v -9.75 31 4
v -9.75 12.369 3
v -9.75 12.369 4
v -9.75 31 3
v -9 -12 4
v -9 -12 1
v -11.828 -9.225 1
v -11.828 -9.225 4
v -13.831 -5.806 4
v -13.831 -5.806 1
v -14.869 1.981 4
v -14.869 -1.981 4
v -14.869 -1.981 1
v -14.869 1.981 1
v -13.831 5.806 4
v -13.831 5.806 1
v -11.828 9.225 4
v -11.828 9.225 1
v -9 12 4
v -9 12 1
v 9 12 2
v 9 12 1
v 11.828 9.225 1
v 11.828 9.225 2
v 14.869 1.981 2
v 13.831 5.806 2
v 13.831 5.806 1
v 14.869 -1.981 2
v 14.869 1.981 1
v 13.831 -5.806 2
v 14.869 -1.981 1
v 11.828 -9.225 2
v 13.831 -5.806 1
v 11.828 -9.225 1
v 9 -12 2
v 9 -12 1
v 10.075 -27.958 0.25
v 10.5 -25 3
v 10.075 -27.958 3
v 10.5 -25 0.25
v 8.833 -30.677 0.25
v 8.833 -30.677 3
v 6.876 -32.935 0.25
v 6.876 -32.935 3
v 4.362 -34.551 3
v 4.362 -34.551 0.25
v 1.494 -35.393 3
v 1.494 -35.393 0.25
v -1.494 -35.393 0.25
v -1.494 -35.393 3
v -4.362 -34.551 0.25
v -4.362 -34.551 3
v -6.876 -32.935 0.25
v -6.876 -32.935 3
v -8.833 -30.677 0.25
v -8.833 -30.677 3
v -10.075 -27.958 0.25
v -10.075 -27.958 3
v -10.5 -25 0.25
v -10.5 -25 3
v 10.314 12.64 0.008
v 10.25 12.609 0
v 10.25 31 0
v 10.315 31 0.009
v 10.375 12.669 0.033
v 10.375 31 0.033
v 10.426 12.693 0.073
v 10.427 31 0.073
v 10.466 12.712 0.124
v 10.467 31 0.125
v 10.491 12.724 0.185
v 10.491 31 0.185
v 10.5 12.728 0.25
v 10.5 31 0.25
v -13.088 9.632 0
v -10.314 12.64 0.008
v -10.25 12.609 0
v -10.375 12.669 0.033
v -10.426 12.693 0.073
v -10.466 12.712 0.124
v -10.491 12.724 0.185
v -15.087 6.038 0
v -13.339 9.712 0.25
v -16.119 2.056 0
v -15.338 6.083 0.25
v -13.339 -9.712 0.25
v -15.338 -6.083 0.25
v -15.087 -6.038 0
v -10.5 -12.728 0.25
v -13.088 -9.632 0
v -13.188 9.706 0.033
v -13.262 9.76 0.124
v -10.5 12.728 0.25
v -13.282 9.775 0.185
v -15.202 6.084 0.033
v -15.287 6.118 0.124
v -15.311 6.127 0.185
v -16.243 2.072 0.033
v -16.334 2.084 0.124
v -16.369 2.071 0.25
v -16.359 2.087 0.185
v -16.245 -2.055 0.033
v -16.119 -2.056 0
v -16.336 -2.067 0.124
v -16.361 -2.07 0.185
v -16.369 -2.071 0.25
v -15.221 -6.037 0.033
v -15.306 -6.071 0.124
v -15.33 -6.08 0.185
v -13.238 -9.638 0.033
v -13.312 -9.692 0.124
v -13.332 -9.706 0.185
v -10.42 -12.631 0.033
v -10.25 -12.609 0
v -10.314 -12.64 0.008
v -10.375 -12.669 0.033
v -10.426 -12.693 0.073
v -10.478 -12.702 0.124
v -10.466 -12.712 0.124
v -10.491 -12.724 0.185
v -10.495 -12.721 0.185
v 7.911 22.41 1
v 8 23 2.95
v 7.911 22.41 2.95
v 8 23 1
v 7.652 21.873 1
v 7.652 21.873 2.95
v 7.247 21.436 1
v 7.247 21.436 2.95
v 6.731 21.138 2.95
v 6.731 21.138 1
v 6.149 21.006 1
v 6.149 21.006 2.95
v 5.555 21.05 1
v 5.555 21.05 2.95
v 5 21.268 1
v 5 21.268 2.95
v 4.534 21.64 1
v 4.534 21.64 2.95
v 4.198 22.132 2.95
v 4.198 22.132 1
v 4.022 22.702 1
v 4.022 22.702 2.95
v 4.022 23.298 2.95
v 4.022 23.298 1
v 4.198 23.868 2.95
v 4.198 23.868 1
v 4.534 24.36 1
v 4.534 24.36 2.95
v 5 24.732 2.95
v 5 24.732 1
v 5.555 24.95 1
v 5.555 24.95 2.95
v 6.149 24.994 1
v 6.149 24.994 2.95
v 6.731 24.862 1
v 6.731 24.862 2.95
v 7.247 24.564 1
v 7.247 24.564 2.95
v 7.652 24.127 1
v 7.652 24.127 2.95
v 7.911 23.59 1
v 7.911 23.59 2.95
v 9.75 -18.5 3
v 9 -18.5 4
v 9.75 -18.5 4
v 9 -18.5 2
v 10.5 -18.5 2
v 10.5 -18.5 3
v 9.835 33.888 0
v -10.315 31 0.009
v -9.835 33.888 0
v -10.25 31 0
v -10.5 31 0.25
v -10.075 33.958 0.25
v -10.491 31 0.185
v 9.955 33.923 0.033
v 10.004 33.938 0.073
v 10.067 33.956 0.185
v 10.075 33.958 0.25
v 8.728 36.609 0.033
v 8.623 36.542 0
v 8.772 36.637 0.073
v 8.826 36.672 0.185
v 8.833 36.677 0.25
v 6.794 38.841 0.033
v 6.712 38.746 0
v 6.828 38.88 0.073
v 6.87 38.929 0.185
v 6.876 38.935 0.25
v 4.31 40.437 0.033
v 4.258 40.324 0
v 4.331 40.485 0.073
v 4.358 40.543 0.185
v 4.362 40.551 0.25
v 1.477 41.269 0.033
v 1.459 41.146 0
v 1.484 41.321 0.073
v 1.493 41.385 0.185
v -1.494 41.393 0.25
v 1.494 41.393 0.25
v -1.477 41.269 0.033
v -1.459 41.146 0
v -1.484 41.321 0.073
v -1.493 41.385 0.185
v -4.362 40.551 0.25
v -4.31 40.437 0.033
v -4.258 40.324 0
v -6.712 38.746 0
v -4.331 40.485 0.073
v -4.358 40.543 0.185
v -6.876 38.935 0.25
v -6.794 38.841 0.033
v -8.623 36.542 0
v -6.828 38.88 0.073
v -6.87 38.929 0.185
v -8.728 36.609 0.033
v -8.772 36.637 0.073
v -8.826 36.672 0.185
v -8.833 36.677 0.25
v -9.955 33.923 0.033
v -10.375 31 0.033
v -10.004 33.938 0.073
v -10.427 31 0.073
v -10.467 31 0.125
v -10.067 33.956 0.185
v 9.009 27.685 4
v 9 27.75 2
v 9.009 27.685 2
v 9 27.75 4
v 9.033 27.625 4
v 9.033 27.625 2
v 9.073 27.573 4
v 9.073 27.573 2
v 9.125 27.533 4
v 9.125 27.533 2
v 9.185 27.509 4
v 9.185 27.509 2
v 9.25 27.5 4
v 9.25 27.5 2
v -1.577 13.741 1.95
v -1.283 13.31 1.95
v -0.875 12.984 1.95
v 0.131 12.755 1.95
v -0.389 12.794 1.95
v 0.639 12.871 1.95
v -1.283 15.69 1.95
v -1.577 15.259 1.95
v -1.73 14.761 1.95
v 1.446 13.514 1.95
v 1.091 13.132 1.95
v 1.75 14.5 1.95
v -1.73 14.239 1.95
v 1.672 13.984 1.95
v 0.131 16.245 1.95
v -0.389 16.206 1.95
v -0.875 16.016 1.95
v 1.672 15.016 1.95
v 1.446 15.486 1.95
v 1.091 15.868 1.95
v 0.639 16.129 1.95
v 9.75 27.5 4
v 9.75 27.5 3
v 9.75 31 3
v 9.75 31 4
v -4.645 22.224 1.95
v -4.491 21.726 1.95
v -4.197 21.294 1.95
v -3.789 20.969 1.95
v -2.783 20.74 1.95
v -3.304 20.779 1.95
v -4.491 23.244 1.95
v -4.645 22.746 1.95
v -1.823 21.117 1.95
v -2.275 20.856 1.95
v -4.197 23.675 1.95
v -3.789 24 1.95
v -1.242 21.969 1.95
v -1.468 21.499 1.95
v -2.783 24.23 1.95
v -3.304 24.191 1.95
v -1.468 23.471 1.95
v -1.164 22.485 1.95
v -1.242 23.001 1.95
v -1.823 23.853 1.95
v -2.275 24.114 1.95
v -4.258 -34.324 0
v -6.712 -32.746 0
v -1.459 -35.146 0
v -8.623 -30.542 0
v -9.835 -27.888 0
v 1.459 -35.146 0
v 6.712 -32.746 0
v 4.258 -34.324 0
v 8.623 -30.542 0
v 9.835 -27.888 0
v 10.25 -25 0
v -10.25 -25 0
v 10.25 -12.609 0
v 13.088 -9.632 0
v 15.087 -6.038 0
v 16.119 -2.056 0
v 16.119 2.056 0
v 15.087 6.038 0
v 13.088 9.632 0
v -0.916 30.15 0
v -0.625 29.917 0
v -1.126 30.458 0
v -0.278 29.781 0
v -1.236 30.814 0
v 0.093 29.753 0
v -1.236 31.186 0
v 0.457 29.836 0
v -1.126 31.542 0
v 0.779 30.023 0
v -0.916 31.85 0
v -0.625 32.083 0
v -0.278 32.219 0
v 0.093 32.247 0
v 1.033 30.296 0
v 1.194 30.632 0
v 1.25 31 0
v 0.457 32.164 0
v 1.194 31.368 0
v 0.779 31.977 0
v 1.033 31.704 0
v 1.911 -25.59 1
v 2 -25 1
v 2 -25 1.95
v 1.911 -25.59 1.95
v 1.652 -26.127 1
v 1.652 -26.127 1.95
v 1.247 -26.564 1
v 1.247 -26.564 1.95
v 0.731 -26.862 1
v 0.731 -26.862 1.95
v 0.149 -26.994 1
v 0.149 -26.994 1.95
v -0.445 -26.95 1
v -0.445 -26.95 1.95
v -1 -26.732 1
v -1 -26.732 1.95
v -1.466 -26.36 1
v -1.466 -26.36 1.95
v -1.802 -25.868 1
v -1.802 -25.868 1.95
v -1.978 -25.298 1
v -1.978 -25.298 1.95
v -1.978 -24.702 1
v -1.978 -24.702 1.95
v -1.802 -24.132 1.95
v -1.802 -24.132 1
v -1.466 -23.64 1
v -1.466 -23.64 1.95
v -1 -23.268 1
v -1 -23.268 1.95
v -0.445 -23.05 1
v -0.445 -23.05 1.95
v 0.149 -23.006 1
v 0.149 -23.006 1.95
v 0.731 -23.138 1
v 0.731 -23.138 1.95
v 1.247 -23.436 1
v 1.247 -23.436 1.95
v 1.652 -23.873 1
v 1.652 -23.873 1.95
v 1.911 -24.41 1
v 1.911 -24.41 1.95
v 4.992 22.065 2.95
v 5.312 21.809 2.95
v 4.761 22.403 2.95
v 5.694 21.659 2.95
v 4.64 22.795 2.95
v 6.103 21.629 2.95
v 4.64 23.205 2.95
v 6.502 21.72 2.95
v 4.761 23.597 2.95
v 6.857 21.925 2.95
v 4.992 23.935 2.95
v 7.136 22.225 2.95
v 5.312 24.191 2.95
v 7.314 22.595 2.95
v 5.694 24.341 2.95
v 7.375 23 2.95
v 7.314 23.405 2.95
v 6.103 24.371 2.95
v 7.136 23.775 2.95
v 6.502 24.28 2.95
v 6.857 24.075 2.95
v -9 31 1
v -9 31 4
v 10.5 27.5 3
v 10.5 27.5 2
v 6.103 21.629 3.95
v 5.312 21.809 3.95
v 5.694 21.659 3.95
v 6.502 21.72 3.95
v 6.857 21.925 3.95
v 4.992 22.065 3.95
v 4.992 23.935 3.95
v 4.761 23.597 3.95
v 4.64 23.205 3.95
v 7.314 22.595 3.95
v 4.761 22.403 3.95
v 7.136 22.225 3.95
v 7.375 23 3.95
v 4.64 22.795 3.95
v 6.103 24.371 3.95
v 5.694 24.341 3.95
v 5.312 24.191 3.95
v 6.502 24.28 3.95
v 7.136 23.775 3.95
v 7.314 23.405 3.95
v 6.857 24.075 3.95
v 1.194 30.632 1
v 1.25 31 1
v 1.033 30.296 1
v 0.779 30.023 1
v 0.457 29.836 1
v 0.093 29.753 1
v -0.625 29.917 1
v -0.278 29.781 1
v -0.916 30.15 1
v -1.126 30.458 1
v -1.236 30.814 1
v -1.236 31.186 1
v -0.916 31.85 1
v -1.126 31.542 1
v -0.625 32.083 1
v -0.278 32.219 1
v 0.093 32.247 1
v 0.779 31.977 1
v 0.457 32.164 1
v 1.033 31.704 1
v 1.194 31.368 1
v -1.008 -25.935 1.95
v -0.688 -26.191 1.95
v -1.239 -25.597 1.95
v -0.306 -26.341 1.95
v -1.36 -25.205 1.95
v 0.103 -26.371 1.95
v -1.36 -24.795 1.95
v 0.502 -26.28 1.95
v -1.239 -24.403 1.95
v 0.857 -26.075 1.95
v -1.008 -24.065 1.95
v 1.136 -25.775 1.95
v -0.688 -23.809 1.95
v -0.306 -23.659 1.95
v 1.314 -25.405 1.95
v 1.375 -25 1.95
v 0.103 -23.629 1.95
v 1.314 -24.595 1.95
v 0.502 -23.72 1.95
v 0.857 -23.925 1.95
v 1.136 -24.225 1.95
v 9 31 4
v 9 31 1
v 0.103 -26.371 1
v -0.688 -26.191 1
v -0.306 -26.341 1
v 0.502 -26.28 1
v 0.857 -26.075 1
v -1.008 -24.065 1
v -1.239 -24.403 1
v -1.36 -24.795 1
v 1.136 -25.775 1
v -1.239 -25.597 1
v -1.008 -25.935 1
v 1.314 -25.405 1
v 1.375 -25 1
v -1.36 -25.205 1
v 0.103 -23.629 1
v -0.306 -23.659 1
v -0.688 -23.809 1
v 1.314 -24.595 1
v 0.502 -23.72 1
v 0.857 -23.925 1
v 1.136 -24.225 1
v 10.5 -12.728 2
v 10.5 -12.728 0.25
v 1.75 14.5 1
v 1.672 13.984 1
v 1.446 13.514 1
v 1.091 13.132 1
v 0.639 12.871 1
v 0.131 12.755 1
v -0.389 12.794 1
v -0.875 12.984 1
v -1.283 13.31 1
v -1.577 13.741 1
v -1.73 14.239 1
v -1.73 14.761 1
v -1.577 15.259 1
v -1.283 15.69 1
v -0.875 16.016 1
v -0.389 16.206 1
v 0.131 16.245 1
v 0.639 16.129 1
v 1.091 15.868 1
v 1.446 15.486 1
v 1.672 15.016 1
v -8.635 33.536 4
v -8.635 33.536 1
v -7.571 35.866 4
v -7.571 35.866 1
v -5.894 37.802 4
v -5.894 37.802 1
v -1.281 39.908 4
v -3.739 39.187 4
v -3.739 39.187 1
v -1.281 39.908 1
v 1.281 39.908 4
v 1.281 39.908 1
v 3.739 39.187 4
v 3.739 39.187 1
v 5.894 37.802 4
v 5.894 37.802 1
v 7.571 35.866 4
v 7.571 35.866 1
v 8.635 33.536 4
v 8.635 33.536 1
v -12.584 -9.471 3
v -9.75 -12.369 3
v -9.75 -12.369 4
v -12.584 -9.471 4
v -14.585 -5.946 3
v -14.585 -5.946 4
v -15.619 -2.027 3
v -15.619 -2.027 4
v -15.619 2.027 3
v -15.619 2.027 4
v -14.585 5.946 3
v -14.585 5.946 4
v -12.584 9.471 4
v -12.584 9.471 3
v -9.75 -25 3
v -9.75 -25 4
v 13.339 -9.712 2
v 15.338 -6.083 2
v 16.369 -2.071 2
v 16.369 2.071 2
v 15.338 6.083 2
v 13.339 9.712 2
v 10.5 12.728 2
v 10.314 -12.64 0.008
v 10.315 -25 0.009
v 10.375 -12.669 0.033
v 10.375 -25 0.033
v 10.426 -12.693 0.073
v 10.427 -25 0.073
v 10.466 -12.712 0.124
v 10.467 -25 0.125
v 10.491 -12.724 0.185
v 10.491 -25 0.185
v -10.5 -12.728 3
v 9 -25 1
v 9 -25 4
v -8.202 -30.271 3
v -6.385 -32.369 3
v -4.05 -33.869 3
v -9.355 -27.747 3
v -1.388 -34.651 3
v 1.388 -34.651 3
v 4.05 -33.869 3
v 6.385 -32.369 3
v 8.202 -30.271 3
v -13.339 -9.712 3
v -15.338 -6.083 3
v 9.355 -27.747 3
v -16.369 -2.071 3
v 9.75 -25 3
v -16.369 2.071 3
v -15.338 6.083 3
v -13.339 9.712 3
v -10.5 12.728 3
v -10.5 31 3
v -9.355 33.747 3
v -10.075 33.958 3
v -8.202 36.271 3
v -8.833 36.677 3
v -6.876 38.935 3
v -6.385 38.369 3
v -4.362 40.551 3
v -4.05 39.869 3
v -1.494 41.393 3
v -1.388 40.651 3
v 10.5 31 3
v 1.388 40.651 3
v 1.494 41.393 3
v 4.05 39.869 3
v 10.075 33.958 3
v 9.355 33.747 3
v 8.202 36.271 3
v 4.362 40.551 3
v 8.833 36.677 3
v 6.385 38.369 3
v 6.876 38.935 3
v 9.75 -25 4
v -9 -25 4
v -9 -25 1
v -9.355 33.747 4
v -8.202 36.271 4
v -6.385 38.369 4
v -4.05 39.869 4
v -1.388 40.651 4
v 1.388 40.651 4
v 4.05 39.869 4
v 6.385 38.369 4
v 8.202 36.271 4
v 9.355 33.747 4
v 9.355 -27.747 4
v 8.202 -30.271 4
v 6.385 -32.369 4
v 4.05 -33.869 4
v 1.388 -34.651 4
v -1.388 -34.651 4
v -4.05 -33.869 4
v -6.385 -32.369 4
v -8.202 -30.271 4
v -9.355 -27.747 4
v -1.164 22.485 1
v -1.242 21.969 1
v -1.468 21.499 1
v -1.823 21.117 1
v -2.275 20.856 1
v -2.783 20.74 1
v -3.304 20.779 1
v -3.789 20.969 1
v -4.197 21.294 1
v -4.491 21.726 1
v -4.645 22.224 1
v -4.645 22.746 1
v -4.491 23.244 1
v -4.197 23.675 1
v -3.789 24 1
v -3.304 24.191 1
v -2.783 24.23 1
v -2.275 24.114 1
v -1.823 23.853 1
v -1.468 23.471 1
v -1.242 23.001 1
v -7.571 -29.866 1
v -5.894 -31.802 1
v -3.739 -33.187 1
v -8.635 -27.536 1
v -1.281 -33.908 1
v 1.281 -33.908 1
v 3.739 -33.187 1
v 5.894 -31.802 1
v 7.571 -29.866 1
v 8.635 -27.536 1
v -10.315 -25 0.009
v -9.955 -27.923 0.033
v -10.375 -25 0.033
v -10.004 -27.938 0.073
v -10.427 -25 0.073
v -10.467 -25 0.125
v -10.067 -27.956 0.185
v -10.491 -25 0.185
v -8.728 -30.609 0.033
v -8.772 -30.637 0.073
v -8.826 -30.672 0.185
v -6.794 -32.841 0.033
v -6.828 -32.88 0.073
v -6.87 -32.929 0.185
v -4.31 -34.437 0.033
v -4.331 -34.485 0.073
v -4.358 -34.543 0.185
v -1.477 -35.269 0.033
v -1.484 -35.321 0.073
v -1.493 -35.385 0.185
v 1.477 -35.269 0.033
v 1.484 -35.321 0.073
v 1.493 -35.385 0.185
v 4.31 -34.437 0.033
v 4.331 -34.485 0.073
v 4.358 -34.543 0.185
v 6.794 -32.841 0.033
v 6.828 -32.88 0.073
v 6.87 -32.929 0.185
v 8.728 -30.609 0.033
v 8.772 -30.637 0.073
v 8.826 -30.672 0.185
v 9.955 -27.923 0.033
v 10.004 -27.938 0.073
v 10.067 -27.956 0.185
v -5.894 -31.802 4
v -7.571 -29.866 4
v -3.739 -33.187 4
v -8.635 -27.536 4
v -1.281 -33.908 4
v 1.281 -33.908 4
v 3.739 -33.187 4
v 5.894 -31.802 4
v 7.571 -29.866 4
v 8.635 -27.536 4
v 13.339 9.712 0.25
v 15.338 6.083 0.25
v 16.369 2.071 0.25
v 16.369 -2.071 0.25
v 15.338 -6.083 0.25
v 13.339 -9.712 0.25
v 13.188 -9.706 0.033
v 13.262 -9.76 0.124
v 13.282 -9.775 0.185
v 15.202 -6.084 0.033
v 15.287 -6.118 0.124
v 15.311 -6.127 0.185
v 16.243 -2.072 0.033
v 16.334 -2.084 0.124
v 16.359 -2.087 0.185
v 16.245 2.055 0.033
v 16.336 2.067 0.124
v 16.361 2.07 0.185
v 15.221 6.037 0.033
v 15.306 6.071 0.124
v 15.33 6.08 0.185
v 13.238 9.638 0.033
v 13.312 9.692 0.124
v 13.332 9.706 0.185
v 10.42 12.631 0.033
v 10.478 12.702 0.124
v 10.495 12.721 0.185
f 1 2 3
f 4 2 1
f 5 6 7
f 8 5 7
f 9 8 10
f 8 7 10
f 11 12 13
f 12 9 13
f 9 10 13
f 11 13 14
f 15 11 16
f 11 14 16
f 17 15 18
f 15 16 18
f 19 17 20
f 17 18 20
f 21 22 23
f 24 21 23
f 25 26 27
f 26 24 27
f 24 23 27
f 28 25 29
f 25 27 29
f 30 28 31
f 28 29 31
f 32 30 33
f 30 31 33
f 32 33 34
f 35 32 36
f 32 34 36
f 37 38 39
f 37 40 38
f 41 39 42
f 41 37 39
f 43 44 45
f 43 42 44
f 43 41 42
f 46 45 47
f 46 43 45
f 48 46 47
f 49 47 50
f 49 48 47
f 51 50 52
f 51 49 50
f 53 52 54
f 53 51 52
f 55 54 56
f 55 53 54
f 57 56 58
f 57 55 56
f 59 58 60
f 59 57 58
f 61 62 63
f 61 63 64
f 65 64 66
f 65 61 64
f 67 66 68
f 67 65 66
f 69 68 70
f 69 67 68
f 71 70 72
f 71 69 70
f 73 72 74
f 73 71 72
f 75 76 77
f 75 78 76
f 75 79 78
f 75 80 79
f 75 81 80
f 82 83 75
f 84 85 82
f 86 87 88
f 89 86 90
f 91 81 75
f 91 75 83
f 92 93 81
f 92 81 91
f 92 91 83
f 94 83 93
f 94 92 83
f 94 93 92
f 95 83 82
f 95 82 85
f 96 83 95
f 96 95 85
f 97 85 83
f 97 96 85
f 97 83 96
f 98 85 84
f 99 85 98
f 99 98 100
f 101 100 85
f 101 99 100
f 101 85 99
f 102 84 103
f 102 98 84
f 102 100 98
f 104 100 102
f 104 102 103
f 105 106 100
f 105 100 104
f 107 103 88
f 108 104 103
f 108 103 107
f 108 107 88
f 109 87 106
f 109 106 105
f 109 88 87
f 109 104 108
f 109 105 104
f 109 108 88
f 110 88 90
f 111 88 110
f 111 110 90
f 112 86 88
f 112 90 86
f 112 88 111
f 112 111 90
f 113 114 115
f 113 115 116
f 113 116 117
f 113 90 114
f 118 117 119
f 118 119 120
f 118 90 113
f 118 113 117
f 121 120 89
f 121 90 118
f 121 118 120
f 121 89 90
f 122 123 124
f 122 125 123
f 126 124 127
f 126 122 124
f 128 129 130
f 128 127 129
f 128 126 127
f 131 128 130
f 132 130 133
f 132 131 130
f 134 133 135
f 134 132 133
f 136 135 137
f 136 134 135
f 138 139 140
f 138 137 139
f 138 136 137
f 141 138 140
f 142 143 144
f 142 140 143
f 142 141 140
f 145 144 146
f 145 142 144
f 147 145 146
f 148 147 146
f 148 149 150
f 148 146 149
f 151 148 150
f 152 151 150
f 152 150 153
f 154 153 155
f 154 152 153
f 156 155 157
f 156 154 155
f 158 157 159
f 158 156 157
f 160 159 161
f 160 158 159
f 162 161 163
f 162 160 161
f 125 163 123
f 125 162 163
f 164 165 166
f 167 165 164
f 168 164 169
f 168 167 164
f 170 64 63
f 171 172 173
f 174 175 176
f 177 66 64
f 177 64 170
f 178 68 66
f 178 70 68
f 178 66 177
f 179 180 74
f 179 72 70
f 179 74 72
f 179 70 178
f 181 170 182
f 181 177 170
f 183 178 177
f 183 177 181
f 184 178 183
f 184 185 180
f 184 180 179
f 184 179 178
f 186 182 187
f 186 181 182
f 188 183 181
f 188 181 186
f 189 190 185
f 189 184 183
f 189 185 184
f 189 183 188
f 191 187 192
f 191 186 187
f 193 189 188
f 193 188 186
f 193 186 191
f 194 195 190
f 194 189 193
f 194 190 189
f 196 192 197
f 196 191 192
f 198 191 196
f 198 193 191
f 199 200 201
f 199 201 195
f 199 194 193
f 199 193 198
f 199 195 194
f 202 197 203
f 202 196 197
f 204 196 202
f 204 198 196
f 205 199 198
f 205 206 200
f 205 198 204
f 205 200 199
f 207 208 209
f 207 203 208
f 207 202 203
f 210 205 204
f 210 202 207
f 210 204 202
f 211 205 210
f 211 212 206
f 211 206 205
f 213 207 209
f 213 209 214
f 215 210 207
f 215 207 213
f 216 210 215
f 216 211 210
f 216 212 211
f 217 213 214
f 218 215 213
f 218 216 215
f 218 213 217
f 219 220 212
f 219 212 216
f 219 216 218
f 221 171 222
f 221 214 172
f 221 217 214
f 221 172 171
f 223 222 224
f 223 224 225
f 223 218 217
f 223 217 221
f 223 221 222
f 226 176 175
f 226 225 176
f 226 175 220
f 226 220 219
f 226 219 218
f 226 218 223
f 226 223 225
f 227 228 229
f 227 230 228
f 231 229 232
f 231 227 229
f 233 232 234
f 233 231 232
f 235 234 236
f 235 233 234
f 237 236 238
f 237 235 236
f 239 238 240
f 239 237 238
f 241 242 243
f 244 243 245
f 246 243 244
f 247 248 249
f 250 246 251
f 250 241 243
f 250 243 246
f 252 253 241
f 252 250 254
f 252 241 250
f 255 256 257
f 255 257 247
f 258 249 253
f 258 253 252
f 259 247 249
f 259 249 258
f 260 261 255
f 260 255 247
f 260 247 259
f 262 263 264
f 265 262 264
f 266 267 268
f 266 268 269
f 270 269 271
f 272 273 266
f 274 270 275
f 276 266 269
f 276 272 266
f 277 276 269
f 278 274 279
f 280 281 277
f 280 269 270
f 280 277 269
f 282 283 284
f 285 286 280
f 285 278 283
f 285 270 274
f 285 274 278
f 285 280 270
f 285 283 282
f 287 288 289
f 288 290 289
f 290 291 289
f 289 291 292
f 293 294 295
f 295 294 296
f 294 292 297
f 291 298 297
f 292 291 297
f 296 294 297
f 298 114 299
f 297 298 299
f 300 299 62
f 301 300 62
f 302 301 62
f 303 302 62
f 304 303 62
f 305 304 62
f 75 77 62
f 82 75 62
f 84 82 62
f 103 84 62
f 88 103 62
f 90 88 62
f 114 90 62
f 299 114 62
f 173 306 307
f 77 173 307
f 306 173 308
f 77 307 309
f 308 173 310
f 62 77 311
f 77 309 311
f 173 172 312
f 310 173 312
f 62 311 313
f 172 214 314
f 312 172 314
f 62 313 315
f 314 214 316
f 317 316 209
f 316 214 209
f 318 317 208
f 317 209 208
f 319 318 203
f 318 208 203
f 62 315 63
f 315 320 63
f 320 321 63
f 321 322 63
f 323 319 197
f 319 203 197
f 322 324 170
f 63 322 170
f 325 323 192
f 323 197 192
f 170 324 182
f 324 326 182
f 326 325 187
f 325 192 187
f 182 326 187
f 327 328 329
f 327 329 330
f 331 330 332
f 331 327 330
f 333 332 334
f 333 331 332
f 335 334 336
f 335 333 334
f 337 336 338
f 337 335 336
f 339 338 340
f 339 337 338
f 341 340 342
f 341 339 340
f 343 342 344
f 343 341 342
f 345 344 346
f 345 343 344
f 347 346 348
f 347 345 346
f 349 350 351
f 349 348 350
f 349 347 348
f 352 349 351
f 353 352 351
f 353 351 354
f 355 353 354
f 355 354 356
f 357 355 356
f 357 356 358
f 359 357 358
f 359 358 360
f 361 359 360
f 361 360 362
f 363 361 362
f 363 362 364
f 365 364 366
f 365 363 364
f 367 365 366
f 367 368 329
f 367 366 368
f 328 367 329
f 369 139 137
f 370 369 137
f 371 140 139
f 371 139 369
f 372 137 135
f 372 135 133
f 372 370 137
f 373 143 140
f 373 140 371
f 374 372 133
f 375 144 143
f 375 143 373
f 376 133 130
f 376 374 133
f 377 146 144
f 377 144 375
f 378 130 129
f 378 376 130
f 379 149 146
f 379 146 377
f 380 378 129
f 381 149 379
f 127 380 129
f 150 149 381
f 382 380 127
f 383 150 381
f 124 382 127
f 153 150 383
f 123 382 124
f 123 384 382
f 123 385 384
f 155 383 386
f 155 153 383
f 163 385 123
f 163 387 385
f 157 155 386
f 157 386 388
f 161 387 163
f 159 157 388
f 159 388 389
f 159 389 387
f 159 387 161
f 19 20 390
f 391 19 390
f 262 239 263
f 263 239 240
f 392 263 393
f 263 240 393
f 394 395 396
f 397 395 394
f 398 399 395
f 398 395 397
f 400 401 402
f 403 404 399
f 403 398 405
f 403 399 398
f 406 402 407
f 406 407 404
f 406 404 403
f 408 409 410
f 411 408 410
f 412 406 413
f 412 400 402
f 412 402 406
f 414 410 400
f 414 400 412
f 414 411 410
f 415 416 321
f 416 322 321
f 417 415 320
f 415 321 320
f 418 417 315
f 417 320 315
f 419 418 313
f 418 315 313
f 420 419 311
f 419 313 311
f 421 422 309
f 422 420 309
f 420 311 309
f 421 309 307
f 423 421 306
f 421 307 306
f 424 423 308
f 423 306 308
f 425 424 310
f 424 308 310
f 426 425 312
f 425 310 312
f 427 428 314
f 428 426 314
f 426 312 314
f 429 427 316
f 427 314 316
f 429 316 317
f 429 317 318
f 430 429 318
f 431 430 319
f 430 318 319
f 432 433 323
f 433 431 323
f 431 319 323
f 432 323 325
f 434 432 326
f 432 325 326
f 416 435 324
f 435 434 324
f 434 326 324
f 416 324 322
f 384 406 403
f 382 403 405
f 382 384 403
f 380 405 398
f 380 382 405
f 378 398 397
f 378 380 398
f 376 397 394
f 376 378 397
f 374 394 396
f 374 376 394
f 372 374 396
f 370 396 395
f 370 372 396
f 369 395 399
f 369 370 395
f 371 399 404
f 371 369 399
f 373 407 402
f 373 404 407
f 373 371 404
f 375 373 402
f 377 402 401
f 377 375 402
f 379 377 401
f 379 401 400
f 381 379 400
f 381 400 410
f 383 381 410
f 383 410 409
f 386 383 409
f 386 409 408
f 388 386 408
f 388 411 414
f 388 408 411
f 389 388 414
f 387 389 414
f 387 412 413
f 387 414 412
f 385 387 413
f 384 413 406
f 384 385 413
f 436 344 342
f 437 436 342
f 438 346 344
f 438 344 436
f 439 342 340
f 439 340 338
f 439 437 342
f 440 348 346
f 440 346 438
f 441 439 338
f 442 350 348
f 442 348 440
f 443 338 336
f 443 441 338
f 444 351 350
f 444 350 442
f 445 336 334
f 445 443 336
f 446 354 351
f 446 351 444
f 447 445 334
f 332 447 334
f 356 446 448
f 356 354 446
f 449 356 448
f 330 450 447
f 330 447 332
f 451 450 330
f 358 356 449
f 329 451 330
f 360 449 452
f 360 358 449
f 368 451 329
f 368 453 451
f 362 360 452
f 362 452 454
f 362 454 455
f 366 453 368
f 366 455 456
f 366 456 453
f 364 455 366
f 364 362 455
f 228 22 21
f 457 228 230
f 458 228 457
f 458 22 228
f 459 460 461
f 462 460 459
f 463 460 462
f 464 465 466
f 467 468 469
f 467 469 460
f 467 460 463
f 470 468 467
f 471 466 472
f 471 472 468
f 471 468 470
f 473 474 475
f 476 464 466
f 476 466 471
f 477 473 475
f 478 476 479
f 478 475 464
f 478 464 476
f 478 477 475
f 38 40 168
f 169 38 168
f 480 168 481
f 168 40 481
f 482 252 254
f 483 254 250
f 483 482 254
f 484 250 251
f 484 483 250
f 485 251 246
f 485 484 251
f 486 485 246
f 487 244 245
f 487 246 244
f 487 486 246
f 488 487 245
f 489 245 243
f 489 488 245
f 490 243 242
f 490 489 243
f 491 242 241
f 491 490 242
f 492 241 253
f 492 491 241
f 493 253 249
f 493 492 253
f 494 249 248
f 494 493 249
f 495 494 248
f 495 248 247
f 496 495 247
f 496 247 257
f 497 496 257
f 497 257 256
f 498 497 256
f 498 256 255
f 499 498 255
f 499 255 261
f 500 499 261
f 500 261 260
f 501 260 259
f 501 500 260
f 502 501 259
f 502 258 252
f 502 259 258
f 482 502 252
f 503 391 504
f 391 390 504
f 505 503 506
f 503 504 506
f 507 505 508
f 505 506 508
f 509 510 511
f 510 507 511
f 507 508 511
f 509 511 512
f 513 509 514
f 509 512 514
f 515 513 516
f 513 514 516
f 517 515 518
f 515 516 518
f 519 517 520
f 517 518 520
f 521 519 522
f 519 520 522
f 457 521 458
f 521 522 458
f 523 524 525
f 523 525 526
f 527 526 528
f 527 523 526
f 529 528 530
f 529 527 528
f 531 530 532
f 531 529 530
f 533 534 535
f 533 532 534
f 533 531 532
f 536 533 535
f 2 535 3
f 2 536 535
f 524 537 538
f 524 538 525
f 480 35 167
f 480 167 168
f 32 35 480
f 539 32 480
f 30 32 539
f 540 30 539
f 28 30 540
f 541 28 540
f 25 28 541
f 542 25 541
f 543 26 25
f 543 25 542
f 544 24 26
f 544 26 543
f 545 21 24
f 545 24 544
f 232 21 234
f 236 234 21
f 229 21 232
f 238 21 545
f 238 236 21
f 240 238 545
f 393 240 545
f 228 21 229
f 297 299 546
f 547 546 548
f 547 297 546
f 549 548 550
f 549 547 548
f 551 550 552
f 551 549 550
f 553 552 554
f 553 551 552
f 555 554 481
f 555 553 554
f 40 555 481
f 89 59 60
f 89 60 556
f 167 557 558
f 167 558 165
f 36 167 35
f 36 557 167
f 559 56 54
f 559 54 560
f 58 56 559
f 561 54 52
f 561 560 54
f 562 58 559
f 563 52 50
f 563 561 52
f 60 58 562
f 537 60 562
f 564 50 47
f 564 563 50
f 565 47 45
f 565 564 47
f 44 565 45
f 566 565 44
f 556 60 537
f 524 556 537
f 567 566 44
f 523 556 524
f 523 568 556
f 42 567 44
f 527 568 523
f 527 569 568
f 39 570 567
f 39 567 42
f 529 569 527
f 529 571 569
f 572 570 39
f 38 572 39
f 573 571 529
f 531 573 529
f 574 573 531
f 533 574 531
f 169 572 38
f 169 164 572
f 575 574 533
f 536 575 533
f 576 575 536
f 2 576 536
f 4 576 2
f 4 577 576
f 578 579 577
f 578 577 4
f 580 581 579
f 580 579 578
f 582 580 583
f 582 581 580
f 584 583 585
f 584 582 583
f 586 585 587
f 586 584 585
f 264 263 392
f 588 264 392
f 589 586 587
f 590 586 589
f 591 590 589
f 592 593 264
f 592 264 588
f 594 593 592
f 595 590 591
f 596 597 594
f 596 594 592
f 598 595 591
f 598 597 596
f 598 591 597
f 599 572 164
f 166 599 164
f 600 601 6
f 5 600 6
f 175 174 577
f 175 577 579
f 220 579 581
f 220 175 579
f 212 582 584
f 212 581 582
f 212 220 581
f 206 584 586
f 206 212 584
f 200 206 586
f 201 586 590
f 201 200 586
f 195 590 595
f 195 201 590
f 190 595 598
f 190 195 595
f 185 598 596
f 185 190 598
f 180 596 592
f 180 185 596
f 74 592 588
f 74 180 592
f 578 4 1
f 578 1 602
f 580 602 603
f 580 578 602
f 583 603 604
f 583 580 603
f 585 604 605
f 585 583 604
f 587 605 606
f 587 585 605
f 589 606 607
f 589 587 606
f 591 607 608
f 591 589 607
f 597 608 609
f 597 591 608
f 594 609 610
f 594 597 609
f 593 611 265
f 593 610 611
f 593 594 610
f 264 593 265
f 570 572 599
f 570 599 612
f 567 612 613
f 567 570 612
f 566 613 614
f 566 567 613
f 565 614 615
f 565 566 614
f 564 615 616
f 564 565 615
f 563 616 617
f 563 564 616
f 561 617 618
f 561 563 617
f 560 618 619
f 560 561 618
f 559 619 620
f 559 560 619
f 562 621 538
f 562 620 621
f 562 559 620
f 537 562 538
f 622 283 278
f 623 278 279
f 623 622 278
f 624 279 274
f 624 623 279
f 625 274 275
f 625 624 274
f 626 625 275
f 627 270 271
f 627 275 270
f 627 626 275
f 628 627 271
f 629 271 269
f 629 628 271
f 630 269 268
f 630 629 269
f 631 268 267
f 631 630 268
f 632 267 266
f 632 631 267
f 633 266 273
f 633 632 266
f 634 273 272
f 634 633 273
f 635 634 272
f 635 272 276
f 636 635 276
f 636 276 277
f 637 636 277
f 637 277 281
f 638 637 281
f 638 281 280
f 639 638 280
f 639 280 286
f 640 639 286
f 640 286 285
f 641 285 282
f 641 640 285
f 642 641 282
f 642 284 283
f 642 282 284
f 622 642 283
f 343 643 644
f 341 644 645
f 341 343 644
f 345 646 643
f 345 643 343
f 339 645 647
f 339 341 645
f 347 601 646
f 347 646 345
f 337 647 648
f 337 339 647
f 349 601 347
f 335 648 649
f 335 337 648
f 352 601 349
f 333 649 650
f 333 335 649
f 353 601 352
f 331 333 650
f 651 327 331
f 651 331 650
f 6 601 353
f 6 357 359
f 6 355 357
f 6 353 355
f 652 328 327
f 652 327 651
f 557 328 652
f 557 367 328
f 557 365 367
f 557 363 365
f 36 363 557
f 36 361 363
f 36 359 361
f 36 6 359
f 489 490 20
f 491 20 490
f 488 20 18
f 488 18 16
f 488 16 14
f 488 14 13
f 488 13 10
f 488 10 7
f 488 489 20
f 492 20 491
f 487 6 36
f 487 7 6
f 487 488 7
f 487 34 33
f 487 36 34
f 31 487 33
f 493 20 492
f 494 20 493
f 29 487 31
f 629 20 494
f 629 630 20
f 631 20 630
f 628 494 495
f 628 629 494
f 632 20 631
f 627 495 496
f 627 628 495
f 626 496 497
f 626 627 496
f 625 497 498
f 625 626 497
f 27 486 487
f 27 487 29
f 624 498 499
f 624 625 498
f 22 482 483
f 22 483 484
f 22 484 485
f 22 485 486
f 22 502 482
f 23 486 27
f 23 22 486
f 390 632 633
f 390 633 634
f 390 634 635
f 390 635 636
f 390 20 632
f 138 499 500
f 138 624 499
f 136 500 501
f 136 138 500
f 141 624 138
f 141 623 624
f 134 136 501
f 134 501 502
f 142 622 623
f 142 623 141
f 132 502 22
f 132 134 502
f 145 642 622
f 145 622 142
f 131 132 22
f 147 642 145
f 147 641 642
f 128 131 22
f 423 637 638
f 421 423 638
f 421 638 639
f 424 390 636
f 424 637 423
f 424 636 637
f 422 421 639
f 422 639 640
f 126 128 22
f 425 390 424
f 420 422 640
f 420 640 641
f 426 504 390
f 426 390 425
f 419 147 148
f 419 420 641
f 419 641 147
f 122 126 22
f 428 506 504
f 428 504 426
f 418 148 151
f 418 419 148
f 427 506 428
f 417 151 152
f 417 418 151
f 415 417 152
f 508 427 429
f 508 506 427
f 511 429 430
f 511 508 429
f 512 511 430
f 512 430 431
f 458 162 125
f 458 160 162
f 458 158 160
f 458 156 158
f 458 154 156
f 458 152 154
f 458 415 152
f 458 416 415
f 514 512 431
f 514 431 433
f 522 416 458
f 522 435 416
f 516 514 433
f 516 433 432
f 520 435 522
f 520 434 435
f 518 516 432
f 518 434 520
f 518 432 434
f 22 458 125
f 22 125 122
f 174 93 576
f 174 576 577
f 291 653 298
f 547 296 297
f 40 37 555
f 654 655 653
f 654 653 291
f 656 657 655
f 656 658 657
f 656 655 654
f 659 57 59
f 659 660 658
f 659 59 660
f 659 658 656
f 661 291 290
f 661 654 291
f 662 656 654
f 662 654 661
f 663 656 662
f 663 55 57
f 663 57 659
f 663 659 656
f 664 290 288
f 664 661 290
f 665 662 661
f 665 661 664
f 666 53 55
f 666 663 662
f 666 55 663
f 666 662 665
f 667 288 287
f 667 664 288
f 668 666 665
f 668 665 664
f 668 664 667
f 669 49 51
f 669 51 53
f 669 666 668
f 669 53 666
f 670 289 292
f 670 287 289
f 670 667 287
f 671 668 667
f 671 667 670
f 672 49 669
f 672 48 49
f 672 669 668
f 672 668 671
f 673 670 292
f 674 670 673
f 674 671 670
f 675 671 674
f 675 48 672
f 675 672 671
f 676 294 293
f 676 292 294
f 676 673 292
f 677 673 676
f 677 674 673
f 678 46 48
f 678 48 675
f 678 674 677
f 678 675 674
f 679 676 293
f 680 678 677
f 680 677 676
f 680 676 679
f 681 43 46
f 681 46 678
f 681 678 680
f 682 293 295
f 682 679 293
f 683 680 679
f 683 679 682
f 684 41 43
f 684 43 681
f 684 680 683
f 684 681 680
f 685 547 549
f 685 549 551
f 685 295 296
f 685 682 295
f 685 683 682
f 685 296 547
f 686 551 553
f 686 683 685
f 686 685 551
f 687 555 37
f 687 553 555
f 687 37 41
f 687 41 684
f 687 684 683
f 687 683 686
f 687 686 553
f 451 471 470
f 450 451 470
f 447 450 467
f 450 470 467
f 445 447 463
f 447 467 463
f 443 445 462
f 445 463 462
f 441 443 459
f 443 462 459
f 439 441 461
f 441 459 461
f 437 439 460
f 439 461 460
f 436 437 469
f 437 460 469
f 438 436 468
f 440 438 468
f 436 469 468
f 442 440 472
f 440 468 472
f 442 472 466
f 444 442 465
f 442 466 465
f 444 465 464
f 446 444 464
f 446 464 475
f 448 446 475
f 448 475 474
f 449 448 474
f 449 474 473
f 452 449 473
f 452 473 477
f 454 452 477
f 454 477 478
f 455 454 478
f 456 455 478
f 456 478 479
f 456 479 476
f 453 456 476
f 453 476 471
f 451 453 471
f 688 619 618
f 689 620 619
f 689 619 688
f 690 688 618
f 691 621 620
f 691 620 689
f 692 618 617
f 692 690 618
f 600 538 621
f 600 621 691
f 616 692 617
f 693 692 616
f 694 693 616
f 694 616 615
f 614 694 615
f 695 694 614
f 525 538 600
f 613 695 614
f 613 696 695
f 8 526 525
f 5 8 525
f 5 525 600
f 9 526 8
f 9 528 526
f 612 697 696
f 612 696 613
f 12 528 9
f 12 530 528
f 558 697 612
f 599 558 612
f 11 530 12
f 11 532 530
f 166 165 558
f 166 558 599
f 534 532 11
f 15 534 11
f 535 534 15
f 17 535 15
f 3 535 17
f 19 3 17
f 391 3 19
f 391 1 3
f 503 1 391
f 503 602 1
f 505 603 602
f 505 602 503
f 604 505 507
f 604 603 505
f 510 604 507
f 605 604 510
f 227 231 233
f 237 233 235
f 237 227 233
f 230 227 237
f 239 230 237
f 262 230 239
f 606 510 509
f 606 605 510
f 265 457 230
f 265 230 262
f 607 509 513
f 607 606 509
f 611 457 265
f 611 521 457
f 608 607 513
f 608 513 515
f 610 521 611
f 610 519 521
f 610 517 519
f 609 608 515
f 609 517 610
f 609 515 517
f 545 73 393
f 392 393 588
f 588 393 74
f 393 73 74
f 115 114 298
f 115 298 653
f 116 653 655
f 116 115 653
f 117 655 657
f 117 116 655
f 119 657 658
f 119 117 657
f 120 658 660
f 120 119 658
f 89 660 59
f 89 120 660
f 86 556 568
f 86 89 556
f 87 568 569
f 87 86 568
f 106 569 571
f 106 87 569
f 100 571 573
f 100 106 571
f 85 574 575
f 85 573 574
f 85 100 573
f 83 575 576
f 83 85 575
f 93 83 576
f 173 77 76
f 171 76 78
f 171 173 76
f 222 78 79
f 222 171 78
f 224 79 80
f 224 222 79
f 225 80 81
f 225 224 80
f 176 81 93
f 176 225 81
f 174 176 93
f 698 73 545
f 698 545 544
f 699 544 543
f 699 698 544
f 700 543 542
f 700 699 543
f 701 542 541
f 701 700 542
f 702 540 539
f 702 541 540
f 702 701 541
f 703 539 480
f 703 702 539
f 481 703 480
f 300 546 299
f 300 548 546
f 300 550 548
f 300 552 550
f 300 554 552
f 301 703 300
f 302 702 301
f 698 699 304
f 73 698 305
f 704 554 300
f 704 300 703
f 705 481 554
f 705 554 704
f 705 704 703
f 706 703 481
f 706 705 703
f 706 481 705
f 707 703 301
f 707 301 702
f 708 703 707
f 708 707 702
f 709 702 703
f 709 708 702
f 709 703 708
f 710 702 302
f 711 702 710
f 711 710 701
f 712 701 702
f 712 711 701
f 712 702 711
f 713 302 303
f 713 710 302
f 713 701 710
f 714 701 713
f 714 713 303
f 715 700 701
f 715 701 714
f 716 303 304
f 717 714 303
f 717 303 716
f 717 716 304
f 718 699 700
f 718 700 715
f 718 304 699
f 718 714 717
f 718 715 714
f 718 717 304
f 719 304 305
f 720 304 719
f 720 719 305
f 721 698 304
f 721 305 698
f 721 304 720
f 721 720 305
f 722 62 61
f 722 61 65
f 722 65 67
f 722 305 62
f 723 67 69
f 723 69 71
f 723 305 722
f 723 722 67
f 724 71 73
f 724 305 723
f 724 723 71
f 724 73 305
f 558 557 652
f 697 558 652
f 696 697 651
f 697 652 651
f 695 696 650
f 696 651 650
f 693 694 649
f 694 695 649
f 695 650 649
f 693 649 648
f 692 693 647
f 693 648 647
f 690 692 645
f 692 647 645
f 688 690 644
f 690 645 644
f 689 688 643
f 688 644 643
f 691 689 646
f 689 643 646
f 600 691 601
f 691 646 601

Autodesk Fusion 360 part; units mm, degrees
sketch "Sketch1" plane through (0, 0, 0) normal (0, 0, 1) x (1, 0, 0)
  circle A0 centre (-2.9141, 22.4848) radius 1.25
  line L0 (-9, 12) -> (-9, 31)
  arc A1 (9, -12) -> (9, 12) centre (0, 0) ccw
  arc A2 (-10.5, -25) -> (10.5, -25) centre (0, -25) ccw
  line L1 (0, 0) -> (0, 12) construction
  circle A3 centre (0, 0) radius 3
  arc A4 (9, 31) -> (-9, 31) centre (0, 31) ccw
  arc A5 (10.5, -12.7279) -> (10.5, 12.7279) centre (0, 0) ccw
  circle A6 centre (0, 31) radius 1.25
  line L2 (-10.5, -25) -> (-10.5, -12.7279)
  arc A7 (-9, 12) -> (-9, -12) centre (0, 0) ccw
  line L3 (9, -25) -> (9, -12)
  circle A8 centre (0, 0) radius 12 construction
  circle A9 centre (-2.9141, 22.4848) radius 2.5 construction
  line L4 (10.5, -25) -> (10.5, -12.7279)
  circle A10 centre (0, 14.5) radius 2.5 construction
  arc A11 (-9, -25) -> (9, -25) centre (0, -25) ccw
  line L5 (-9, -25) -> (-9, -12)
  line L6 (0, -25) -> (0, 0) construction
  arc A12 (10.5, 31) -> (-10.5, 31) centre (0, 31) ccw
  circle A13 centre (0, 14.5) radius 6 construction
  line L7 (10.5, 12.7279) -> (10.5, 31)
  line L8 (-10.5, 12.7279) -> (-10.5, 31)
  circle A14 centre (0, 14.5) radius 1.25
  line L9 (0, 14.5) -> (0, 12) construction
  arc A15 (-10.5, 12.7279) -> (-10.5, -12.7279) centre (0, 0) ccw
  line L10 (-9, 21.5) -> (-10.5, 21.5) construction
  line L11 (-6, 23) -> (-9, 23) construction
  circle A16 centre (0, 31) radius 4.5 construction
  line L12 (9, 12) -> (9, 31)
  circle A17 centre (-2.9141, 22.4848) radius 4.5 construction
  line L13 (9, 21.5) -> (10.5, 21.5) construction
  line L14 (9, 27.5) -> (10.5, 27.5)
  line L15 (9, 23) -> (10.5, 23) construction
  line L16 (9, 23) -> (6, 23) construction
  circle A18 centre (6, 23) radius 2
  arc A19 (9.75, 31) -> (-9.75, 31) centre (0, 31) ccw
  line L17 (-9.75, 12.3693) -> (-9.75, 31)
  arc A20 (-9.75, 12.3693) -> (-9.75, -12.3693) centre (0, 0) ccw
  line L18 (-9.75, -25) -> (-9.75, -12.3693)
  arc A21 (-9.75, -25) -> (9.75, -25) centre (0, -25) ccw
  line L19 (9.75, -25) -> (9.75, -18.5)
  line L20 (9.75, 27.5) -> (9.75, 31)
  line L21 (9, -18.5) -> (10.5, -18.5)
  circle A22 centre (6, 23) radius 1.375
  circle A23 centre (0, 0) radius 2
  circle A24 centre (0, -25) radius 2
  circle A25 centre (0, -25) radius 1.375
  circle A26 centre (0, 14.5) radius 1.75
  circle A27 centre (-2.9141, 22.4848) radius 1.75
  dimension "d1" = 1.5
  dimension "d3" = 56
  dimension "d4" = 30
  dimension "d5" = 18
  dimension "d6" = 18
  dimension "d7" = 6
  dimension "d8" = 24
  dimension "d9" = 25
  dimension "d10" = 12
  dimension "d11" = 5
  dimension "d12" = 9
  dimension "d13" = 5
  dimension "d14" = 9
  dimension "d15" = 15
  dimension "d16" = 2.5
  dimension "d17" = 2.5
  dimension "d18" = 2.5
  dimension "d19" = 3
  dimension "d20" = 8
  dimension "d28" = 6
  dimension "d29" = 8
  dimension "d30" = 3
  dimension "d31" = 4
  dimension "d33" = 3.5
  dimension "d34" = 15.75
  dimension "d35" = 2.75
  dimension "d36" = 4
  dimension "d37" = 2.75
  dimension "d38" = 4
  dimension "d47" = 3.5
  dimension "d48" = 3.5
extrude "Extrude1" add sketch "Sketch1" along normal blind 1 contours L0 A1 A4 A7 L3 A11 L5 L12 | A1 A5 L3 L4 L7 L12 L14 L21 | A26 | A27
extrude "Extrude4" add sketch "Sketch1" along normal blind 2 contours A1 A5 L3 L4 L7 L12 L14 L21
extrude "Extrude5" add sketch "Sketch1" along normal blind 1.95 contours A0 | A14 | A26 | A27
extrude "Extrude6" add sketch "Sketch1" along normal blind 2.95 contours A18 | A22
extrude "Extrude7" add sketch "Sketch1" along normal blind 3.95 contours A22
extrude "Extrude8" add sketch "Sketch1" along normal blind 1 contours A3 | A23
extrude "Extrude9" add sketch "Sketch1" along normal blind 1.95 contours A24 | A25
extrude "Extrude10" cut sketch "Sketch1" along normal blind 1.5 from surface at 1 contours A25
extrude "Extrude2" add sketch "Sketch1" along normal blind 3 contours A2 L2 L4 A12 L7 L8 A15 L14 A19 L17 A20 L18 A21 L19 L20 L21
extrude "Extrude3" add sketch "Sketch1" along normal blind 4 contours L0 A4 A7 L3 A11 L5 L12 L14 A19 L17 A20 L18 A21 L19 L20 L21
fillet "Fillet1" radius 0.25 9 edges at (9, 27.5, 3) (-10.5, -18.864, 0) (0, -35.5, 0) (10.5, -18.864, 0) (16.5, 0, 0) (10.5, 21.864, 0) (0, 41.5, 0) (-10.5, 21.8639, 0) (-16.5, 0, 0)
equation "d6 = d5"
